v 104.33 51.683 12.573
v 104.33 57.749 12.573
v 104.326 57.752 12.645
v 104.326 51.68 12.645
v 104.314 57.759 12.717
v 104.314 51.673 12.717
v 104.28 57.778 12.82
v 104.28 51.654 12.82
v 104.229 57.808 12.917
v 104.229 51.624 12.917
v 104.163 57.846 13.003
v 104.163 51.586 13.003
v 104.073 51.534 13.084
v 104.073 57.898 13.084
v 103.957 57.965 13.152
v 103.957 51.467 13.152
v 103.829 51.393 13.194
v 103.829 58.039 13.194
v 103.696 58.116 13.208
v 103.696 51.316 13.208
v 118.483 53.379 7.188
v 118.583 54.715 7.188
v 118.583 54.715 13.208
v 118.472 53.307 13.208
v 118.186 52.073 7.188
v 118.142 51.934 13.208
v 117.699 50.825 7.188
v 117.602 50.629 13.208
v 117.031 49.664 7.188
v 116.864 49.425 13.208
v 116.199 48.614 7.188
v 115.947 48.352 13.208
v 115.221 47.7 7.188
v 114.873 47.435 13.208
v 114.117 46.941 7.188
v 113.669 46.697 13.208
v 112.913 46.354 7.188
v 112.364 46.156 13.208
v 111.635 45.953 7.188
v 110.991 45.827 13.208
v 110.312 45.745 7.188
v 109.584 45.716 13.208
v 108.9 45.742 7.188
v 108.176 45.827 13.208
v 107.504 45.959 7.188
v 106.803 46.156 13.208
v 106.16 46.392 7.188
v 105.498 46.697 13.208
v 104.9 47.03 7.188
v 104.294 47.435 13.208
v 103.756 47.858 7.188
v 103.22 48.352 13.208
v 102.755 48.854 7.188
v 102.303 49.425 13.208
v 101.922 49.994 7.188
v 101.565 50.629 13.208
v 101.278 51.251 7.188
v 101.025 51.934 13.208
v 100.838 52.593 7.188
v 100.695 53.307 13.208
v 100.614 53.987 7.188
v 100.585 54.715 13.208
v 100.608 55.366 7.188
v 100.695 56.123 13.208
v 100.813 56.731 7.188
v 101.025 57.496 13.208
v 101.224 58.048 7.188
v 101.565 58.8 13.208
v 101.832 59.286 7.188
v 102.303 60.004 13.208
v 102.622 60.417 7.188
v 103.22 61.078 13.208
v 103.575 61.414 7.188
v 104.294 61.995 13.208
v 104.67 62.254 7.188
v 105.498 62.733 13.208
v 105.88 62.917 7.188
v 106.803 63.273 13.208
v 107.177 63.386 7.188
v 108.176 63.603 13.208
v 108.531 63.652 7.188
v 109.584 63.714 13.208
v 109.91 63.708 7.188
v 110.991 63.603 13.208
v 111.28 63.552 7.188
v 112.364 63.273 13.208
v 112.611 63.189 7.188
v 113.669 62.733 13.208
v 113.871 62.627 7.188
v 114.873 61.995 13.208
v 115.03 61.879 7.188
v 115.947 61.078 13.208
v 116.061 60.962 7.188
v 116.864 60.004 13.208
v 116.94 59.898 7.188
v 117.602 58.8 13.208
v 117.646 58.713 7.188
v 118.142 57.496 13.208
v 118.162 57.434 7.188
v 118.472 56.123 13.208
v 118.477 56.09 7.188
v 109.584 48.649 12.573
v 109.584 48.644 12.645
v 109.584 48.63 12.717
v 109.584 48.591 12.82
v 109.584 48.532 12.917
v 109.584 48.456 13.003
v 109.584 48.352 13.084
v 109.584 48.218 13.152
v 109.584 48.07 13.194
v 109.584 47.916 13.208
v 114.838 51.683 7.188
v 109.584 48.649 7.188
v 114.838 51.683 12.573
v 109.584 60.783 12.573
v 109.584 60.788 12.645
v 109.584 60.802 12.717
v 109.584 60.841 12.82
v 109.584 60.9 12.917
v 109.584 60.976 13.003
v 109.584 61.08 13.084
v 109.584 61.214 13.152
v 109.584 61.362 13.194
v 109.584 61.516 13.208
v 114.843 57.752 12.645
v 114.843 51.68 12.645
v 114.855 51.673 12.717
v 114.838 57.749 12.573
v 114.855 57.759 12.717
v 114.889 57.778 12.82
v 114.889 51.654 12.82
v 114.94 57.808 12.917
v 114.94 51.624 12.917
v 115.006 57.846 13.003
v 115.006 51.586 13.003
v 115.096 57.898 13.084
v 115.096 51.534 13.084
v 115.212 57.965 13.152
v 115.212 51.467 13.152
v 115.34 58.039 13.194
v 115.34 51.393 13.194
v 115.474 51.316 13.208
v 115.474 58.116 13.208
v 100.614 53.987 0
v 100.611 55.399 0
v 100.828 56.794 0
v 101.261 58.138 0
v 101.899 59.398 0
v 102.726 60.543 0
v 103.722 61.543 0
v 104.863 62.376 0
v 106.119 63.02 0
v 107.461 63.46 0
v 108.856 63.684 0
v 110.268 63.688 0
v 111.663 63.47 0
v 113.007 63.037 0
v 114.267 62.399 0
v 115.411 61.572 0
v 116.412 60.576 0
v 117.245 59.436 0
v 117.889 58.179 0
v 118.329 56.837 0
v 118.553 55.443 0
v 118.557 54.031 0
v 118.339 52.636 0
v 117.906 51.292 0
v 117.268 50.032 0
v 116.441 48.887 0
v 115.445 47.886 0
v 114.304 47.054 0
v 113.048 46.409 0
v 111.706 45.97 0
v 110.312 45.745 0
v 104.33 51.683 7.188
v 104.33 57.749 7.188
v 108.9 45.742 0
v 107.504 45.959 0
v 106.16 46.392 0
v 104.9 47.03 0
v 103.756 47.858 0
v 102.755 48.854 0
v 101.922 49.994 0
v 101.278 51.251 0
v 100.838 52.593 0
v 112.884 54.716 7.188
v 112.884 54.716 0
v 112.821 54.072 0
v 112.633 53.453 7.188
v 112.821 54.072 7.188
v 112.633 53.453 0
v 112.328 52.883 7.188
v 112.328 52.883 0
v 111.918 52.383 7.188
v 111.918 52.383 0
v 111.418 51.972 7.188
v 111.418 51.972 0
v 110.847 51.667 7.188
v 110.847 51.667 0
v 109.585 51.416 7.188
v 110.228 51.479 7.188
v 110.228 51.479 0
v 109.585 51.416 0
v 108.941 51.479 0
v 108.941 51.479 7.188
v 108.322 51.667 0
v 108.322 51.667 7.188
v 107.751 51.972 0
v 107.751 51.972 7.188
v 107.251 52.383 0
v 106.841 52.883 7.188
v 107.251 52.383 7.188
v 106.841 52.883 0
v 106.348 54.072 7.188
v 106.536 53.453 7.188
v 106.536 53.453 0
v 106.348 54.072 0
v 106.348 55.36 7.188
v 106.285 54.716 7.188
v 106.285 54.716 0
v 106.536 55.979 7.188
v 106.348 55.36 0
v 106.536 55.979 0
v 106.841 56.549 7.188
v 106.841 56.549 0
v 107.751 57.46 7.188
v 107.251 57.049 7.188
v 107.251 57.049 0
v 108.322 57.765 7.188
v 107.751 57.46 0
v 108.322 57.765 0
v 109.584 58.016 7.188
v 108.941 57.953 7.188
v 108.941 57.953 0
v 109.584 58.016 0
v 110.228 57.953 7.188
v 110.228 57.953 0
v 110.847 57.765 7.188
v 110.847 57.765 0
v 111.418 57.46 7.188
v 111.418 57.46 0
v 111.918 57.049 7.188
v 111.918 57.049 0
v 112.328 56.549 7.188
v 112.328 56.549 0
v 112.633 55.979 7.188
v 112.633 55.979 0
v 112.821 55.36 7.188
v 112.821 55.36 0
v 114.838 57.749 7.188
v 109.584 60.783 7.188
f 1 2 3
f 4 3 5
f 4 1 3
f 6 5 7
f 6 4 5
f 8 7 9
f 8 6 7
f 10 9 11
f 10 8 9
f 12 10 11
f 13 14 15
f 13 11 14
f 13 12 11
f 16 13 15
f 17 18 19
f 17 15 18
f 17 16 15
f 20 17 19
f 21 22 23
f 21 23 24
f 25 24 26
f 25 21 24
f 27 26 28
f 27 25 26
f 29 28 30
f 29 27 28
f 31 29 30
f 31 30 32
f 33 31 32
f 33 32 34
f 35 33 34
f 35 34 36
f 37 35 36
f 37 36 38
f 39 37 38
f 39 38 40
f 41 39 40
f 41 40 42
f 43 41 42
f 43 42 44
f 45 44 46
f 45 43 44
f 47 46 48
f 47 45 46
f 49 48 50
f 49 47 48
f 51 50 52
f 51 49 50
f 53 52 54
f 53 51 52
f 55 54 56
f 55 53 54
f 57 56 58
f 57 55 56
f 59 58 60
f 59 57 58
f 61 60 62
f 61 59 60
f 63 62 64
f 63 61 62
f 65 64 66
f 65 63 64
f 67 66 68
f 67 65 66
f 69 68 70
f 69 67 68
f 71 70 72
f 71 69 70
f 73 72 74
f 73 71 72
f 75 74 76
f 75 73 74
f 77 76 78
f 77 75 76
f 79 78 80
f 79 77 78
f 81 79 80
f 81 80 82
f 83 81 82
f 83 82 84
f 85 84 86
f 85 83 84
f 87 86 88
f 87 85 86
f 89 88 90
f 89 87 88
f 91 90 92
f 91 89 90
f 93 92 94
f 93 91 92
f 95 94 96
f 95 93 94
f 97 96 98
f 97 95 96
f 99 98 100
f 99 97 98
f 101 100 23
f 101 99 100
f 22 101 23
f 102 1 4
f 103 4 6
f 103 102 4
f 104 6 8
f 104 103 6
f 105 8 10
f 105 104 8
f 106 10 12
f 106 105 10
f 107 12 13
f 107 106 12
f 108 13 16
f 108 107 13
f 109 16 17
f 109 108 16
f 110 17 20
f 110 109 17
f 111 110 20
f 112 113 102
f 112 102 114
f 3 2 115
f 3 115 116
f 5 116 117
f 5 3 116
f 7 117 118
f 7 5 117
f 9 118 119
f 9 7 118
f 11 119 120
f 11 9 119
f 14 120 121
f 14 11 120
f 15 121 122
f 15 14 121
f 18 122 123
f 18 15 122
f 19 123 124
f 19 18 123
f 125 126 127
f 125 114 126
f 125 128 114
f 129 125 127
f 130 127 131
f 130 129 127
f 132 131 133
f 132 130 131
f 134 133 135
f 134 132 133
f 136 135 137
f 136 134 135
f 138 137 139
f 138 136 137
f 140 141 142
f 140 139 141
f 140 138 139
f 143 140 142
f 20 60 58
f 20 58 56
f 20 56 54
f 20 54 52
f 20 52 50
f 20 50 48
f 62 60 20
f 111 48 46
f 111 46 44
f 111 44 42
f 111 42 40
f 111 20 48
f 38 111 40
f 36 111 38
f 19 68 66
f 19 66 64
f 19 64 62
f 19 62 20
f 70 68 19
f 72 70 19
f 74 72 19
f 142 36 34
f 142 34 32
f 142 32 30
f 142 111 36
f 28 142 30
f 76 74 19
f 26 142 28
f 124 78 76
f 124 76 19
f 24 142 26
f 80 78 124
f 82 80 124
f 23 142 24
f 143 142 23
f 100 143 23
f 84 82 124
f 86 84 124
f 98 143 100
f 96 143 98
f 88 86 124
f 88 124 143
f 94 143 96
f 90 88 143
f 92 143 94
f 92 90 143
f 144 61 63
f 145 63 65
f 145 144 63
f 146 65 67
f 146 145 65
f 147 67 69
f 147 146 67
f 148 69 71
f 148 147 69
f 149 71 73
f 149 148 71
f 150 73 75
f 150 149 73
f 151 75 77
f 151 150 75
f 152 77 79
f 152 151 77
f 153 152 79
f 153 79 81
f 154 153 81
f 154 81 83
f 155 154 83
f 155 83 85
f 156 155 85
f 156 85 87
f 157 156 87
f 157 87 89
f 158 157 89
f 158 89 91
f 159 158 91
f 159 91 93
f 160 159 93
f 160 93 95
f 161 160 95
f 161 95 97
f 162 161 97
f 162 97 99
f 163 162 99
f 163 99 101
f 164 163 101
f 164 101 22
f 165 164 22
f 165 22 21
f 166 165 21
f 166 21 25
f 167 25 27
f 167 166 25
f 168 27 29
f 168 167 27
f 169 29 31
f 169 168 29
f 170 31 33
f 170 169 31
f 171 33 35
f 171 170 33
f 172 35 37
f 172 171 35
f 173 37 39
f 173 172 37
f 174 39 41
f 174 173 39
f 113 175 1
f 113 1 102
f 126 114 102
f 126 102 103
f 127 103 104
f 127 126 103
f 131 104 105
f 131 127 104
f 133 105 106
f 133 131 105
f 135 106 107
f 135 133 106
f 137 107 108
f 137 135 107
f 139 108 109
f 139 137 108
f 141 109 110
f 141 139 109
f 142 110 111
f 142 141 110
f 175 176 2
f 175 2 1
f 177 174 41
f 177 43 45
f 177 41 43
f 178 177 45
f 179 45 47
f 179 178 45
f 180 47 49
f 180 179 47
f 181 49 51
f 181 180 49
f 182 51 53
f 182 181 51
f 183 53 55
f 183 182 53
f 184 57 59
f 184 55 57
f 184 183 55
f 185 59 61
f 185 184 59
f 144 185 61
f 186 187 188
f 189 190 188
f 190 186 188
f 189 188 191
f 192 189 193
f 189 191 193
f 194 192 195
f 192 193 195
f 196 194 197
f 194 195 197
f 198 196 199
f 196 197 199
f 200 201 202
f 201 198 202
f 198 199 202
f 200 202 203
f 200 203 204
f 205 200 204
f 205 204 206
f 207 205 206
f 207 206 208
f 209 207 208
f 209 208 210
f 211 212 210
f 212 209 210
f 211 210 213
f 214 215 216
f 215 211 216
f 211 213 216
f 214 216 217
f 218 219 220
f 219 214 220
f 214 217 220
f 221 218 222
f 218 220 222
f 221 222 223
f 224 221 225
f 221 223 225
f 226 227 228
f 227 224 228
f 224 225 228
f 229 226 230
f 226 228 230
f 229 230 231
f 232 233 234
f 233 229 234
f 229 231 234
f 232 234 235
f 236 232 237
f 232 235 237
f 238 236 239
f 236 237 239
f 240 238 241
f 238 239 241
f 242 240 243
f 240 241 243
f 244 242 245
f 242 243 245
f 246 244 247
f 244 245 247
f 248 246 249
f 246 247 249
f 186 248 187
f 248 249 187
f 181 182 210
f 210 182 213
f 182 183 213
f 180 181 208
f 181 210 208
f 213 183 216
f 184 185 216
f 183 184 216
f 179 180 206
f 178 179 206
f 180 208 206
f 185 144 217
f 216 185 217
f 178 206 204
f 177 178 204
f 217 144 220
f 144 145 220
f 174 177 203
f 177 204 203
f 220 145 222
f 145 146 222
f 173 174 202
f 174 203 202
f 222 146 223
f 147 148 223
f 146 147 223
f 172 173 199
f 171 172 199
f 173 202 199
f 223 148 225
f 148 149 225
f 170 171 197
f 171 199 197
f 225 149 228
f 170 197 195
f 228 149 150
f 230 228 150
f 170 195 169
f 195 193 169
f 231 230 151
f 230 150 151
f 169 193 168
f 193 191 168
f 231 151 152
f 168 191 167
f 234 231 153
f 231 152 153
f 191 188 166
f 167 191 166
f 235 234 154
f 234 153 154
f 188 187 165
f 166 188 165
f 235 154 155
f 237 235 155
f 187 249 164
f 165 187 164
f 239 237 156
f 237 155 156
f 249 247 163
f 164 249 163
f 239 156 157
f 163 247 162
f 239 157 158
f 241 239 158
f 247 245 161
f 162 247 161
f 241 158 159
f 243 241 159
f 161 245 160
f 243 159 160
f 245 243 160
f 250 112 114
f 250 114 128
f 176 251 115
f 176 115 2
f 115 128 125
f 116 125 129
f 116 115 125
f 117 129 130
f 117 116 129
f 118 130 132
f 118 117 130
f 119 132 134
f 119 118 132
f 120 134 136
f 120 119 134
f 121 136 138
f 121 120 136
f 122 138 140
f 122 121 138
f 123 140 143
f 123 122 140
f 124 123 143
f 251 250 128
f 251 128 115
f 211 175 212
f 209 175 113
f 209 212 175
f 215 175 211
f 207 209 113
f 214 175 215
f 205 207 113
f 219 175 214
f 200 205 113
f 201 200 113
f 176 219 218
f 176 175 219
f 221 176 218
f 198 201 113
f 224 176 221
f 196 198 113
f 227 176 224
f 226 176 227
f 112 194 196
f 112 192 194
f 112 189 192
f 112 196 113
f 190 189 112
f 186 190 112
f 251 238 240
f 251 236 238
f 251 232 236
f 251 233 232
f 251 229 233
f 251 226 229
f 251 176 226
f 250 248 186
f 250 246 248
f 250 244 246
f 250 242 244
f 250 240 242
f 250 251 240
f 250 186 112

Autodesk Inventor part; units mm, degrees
ref_plane "YZ Plane" through (0, 0, 0) normal (1, 0, 0) x (0, 1, 0)
ref_plane "XZ Plane" through (0, 0, 0) normal (0, 1, 0) x (-1, 0, 0)
ref_plane "XY Plane" through (0, 0, 0) normal (0, 0, 1) x (1, 0, 0)
sketch "Sketch1" plane through (0, 0, 0) normal (0, 0, 1) x (1, 0, 0)
  circle A0 centre (109.5845, 54.716) radius 3.175 construction
  line L0 (765.556, 95.25) -> (765.556, -44.45) construction
  line L1 (0, 95.25) -> (765.556, 95.25) construction
  line L2 (0, -44.45) -> (0, 95.25) construction
  line L3 (765.556, -44.45) -> (0, -44.45) construction
  arc A1 (100.6141, 53.9869) -> (110.3117, 45.7454) centre (109.5836, 54.7149) ccw projected
  line L4 (123.1622, 19.6987) -> (119.3655, 66.4721) projected
  circle A2 centre (109.5836, 54.7149) radius 8.999
  circle A3 centre (109.5845, 54.716) radius 6 projected
  circle A4 centre (109.5845, 54.716) radius 6.254
  circle A5 centre (109.5845, 54.716) radius 3.3
  point P0 (0, 0)
  dimension "d0" = 0.254
  dimension "d1" = 6.6
extrude "Extrusion1" add sketch "Sketch1" along normal blind 7.1882 contours A2 A1 | A3 | A4
sketch "Sketch2" plane through (109.5836, 54.7149, 7.1882) normal (0, 0, 1) x (1, 0, 0)
  circle A0 centre (0.0009, 0.0011) radius 3.3 projected
  line L0 (-4.9991, 2.8878) -> (0.0009, 5.7746)
  line L1 (0.0009, 5.7746) -> (5.0009, 2.8878)
  line L2 (5.0009, 2.8878) -> (5.0009, -2.8857)
  line L3 (5.0009, -2.8857) -> (0.0009, -5.7724)
  line L4 (0.0009, -5.7724) -> (-4.9991, -2.8857)
  line L5 (-4.9991, -2.8857) -> (-4.9991, 2.8878)
  line L6 (0.0009, 6.0679) -> (-5.2531, 3.0345)
  line L7 (-5.2531, 3.0345) -> (-5.2531, -3.0323)
  line L8 (-5.2531, -3.0323) -> (0.0009, -6.0657)
  line L9 (0.0009, -6.0657) -> (5.2549, -3.0323)
  line L10 (5.2549, -3.0323) -> (5.2549, 3.0345)
  line L11 (5.2549, 3.0345) -> (0.0009, 6.0679)
  circle A1 centre (0, 0) radius 8.999 projected
  point P0 (-109.5836, -54.7149)
  point P1 (-4.9991, -2.8857)
  dimension "d4" = 0.254
extrude "Extrusion2" add sketch "Sketch2" along normal blind 6.0198 contours A1
fillet "Fillet1" radius 0.635 6 edges at (104.3305, 54.716, 13.208) (106.9575, 50.1659, 13.208) (112.2115, 50.1659, 13.208) (114.8385, 54.716, 13.208) (112.2115, 59.2661, 13.208) (106.9575, 59.2661, 13.208)
properties part number "ActuatorSpacer"
